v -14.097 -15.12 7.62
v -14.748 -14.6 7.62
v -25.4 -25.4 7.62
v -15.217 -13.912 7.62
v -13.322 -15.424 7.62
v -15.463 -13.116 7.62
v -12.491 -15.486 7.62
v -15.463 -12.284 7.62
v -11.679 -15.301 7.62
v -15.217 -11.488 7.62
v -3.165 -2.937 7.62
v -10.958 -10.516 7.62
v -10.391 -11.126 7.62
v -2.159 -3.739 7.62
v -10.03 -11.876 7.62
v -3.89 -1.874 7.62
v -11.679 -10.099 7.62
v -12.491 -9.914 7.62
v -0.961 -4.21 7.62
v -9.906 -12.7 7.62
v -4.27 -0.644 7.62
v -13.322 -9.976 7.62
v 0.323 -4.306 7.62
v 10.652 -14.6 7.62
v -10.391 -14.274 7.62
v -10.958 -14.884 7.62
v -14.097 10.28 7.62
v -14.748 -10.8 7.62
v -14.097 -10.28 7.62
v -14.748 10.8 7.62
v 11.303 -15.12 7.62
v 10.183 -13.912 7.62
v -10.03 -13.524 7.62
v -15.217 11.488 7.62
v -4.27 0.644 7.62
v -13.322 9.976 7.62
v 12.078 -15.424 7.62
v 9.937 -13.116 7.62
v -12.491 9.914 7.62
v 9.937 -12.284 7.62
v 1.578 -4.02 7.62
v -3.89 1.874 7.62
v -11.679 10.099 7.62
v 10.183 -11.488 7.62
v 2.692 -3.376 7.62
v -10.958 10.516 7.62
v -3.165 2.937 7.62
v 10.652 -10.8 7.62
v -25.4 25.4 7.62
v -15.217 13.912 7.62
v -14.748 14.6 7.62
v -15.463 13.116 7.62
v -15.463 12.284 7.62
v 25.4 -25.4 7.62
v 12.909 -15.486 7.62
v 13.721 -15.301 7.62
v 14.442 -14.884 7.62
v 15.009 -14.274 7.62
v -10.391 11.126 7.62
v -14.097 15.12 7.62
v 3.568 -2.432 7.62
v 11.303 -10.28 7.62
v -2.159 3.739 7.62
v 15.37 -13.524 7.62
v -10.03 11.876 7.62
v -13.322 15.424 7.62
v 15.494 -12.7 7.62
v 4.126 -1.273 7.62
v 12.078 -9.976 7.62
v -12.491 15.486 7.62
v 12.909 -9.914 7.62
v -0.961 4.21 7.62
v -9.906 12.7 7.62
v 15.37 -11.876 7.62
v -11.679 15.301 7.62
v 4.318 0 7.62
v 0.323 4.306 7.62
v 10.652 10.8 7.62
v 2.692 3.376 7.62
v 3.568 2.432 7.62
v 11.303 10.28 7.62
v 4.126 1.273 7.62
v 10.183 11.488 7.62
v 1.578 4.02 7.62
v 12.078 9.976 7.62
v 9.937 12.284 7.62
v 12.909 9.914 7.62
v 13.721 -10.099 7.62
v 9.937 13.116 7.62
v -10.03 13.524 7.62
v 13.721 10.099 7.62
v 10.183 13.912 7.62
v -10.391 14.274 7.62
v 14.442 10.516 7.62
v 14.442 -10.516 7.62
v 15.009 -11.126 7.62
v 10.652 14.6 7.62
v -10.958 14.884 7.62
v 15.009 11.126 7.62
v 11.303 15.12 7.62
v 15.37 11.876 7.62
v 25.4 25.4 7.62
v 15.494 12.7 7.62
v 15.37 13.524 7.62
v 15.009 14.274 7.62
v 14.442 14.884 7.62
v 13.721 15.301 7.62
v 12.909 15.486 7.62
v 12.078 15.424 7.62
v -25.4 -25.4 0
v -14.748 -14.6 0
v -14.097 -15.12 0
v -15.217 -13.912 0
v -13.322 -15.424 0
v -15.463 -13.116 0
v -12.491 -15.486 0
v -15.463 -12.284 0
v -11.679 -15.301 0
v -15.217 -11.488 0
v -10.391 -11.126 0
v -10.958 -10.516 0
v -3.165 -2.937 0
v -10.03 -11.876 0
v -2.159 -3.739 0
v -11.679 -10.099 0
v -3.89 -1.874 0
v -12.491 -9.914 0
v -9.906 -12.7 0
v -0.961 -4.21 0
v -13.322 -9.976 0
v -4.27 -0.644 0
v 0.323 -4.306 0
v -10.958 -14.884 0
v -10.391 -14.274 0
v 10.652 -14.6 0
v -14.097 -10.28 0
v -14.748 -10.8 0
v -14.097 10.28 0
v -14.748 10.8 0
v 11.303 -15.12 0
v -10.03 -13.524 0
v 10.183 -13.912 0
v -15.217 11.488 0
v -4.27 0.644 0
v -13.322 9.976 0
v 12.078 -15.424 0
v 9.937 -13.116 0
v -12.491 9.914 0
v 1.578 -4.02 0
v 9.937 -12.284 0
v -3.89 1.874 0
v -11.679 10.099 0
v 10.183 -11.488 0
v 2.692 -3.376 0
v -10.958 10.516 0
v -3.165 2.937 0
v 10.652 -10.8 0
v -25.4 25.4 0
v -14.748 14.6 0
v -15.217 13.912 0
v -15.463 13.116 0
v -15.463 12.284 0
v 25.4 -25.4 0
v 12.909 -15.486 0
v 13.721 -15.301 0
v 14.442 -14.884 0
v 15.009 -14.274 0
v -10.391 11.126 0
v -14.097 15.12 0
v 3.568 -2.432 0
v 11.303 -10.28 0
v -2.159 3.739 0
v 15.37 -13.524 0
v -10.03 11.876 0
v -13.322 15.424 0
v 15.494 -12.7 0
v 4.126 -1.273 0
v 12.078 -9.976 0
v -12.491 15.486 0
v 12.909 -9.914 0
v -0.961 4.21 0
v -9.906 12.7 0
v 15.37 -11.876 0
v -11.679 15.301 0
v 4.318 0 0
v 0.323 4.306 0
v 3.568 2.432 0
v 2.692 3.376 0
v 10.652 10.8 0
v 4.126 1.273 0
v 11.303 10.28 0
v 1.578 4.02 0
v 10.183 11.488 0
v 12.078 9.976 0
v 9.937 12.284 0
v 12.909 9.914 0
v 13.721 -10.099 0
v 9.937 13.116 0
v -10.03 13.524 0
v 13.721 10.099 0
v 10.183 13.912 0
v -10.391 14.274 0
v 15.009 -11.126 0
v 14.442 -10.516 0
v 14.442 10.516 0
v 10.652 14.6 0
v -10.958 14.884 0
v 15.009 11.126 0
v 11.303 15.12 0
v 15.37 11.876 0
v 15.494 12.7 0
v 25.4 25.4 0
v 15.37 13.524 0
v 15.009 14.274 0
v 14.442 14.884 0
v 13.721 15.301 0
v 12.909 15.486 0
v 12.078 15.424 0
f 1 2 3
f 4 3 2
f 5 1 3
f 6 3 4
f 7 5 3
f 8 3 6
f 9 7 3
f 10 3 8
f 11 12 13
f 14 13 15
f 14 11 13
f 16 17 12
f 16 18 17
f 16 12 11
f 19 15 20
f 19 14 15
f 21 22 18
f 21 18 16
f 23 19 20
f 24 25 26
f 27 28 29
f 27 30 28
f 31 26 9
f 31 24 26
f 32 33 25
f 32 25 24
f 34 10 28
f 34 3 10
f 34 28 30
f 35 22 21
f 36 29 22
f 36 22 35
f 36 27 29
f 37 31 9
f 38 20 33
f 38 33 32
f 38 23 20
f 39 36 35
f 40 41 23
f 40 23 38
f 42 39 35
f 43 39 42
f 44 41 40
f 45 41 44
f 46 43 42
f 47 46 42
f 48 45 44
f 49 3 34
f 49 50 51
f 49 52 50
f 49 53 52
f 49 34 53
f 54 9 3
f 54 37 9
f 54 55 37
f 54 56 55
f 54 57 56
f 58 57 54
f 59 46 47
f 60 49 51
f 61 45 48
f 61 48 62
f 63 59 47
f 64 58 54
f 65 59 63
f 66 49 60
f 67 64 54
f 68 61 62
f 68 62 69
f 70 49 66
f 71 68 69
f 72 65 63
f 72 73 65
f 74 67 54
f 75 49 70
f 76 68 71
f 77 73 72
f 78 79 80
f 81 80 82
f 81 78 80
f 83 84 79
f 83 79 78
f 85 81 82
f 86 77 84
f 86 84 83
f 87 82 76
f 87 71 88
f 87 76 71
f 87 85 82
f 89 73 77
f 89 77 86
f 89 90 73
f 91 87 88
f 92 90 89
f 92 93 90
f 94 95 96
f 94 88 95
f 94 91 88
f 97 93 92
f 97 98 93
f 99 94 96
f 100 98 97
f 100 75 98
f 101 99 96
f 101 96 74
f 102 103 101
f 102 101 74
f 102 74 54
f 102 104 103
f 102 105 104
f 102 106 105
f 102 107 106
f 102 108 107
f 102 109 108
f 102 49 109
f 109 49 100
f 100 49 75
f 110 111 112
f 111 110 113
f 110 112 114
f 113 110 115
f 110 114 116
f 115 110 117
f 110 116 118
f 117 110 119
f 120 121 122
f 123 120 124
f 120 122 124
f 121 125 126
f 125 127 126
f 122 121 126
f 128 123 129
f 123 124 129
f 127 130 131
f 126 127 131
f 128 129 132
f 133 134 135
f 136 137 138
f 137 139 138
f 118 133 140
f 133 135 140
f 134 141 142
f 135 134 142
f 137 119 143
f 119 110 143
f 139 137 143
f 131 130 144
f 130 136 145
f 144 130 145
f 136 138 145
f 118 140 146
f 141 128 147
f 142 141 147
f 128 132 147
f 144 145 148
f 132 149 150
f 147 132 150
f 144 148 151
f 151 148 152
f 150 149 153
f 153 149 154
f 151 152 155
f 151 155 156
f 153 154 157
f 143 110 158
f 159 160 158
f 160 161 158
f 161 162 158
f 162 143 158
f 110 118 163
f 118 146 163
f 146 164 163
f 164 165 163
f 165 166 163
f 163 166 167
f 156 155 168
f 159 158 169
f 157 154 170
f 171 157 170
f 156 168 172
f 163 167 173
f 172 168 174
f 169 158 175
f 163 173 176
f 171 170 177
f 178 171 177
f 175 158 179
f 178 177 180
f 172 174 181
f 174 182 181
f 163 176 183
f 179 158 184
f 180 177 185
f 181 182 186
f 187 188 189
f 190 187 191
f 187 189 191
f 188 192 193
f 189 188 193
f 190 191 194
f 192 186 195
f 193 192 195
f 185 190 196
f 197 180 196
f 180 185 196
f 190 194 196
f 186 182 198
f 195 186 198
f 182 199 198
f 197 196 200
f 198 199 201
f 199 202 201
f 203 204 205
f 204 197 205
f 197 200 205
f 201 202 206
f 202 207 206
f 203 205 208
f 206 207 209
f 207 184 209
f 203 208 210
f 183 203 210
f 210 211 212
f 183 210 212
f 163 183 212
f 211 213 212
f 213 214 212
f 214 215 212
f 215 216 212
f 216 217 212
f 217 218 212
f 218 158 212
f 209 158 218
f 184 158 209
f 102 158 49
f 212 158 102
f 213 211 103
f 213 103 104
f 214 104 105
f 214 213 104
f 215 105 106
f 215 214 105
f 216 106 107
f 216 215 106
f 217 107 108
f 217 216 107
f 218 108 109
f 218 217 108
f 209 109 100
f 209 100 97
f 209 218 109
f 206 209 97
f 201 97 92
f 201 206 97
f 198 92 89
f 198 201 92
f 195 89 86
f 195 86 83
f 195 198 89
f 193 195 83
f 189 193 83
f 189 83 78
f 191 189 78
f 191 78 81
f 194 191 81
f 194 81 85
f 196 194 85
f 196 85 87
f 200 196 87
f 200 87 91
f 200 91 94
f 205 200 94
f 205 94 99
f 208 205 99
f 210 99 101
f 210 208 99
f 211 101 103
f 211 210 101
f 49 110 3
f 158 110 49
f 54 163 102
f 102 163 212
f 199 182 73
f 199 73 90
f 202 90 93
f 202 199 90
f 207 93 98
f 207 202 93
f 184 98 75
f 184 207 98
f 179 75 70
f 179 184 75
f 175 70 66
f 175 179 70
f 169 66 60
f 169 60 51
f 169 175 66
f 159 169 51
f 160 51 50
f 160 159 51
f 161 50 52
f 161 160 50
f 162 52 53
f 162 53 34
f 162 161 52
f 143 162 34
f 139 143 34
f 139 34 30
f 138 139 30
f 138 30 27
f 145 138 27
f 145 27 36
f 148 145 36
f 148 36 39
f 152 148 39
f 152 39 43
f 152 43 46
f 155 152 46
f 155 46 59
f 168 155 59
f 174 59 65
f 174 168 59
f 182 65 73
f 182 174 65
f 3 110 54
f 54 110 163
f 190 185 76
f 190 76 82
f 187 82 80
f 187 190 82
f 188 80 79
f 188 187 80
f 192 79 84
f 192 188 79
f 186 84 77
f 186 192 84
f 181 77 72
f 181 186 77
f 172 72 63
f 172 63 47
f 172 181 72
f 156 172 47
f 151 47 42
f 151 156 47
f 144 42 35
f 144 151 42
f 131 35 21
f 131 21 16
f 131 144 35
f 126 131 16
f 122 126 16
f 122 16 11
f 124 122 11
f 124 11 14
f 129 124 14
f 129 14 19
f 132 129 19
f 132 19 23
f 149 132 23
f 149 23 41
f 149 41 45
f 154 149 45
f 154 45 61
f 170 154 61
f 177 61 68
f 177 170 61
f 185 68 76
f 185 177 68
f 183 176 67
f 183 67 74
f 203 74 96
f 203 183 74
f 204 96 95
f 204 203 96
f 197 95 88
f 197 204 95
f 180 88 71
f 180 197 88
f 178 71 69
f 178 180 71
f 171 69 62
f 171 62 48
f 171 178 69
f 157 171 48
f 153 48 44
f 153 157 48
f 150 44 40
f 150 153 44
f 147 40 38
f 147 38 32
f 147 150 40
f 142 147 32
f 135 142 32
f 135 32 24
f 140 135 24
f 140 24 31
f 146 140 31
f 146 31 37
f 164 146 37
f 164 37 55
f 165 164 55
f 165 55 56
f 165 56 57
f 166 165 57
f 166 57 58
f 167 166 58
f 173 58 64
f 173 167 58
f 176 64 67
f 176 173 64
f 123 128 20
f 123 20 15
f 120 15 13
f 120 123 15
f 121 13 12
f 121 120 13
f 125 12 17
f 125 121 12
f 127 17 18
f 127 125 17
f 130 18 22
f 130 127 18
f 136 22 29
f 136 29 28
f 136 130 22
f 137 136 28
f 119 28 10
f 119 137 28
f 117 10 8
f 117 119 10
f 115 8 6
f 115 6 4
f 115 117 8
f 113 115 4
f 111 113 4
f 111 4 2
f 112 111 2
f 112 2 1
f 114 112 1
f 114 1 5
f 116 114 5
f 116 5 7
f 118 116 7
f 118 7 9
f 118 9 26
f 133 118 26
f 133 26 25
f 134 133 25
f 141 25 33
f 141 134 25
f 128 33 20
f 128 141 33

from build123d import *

# Parameters (mm, degrees)
F0_W     = 50.8
F0_H     = 50.8
F0_R     = 2.794
F0_R_2   = 4.318
F1_DEPTH = 7.62


with BuildPart() as f1:
    # F0 (on Top) → F1 (new body)
    with BuildSketch(Plane.XY):
        Rectangle(F0_W, F0_H)
        with Locations((-12.7, -12.7)):
            Circle(F0_R, mode=Mode.SUBTRACT)
        Circle(F0_R_2, mode=Mode.SUBTRACT)
        with Locations((12.7, -12.7)):
            Circle(F0_R, mode=Mode.SUBTRACT)
        with Locations((-12.7, 12.7)):
            Circle(F0_R, mode=Mode.SUBTRACT)
        with Locations((12.7, 12.7)):
            Circle(F0_R, mode=Mode.SUBTRACT)
    extrude(amount=F1_DEPTH)


solid = f1.part
